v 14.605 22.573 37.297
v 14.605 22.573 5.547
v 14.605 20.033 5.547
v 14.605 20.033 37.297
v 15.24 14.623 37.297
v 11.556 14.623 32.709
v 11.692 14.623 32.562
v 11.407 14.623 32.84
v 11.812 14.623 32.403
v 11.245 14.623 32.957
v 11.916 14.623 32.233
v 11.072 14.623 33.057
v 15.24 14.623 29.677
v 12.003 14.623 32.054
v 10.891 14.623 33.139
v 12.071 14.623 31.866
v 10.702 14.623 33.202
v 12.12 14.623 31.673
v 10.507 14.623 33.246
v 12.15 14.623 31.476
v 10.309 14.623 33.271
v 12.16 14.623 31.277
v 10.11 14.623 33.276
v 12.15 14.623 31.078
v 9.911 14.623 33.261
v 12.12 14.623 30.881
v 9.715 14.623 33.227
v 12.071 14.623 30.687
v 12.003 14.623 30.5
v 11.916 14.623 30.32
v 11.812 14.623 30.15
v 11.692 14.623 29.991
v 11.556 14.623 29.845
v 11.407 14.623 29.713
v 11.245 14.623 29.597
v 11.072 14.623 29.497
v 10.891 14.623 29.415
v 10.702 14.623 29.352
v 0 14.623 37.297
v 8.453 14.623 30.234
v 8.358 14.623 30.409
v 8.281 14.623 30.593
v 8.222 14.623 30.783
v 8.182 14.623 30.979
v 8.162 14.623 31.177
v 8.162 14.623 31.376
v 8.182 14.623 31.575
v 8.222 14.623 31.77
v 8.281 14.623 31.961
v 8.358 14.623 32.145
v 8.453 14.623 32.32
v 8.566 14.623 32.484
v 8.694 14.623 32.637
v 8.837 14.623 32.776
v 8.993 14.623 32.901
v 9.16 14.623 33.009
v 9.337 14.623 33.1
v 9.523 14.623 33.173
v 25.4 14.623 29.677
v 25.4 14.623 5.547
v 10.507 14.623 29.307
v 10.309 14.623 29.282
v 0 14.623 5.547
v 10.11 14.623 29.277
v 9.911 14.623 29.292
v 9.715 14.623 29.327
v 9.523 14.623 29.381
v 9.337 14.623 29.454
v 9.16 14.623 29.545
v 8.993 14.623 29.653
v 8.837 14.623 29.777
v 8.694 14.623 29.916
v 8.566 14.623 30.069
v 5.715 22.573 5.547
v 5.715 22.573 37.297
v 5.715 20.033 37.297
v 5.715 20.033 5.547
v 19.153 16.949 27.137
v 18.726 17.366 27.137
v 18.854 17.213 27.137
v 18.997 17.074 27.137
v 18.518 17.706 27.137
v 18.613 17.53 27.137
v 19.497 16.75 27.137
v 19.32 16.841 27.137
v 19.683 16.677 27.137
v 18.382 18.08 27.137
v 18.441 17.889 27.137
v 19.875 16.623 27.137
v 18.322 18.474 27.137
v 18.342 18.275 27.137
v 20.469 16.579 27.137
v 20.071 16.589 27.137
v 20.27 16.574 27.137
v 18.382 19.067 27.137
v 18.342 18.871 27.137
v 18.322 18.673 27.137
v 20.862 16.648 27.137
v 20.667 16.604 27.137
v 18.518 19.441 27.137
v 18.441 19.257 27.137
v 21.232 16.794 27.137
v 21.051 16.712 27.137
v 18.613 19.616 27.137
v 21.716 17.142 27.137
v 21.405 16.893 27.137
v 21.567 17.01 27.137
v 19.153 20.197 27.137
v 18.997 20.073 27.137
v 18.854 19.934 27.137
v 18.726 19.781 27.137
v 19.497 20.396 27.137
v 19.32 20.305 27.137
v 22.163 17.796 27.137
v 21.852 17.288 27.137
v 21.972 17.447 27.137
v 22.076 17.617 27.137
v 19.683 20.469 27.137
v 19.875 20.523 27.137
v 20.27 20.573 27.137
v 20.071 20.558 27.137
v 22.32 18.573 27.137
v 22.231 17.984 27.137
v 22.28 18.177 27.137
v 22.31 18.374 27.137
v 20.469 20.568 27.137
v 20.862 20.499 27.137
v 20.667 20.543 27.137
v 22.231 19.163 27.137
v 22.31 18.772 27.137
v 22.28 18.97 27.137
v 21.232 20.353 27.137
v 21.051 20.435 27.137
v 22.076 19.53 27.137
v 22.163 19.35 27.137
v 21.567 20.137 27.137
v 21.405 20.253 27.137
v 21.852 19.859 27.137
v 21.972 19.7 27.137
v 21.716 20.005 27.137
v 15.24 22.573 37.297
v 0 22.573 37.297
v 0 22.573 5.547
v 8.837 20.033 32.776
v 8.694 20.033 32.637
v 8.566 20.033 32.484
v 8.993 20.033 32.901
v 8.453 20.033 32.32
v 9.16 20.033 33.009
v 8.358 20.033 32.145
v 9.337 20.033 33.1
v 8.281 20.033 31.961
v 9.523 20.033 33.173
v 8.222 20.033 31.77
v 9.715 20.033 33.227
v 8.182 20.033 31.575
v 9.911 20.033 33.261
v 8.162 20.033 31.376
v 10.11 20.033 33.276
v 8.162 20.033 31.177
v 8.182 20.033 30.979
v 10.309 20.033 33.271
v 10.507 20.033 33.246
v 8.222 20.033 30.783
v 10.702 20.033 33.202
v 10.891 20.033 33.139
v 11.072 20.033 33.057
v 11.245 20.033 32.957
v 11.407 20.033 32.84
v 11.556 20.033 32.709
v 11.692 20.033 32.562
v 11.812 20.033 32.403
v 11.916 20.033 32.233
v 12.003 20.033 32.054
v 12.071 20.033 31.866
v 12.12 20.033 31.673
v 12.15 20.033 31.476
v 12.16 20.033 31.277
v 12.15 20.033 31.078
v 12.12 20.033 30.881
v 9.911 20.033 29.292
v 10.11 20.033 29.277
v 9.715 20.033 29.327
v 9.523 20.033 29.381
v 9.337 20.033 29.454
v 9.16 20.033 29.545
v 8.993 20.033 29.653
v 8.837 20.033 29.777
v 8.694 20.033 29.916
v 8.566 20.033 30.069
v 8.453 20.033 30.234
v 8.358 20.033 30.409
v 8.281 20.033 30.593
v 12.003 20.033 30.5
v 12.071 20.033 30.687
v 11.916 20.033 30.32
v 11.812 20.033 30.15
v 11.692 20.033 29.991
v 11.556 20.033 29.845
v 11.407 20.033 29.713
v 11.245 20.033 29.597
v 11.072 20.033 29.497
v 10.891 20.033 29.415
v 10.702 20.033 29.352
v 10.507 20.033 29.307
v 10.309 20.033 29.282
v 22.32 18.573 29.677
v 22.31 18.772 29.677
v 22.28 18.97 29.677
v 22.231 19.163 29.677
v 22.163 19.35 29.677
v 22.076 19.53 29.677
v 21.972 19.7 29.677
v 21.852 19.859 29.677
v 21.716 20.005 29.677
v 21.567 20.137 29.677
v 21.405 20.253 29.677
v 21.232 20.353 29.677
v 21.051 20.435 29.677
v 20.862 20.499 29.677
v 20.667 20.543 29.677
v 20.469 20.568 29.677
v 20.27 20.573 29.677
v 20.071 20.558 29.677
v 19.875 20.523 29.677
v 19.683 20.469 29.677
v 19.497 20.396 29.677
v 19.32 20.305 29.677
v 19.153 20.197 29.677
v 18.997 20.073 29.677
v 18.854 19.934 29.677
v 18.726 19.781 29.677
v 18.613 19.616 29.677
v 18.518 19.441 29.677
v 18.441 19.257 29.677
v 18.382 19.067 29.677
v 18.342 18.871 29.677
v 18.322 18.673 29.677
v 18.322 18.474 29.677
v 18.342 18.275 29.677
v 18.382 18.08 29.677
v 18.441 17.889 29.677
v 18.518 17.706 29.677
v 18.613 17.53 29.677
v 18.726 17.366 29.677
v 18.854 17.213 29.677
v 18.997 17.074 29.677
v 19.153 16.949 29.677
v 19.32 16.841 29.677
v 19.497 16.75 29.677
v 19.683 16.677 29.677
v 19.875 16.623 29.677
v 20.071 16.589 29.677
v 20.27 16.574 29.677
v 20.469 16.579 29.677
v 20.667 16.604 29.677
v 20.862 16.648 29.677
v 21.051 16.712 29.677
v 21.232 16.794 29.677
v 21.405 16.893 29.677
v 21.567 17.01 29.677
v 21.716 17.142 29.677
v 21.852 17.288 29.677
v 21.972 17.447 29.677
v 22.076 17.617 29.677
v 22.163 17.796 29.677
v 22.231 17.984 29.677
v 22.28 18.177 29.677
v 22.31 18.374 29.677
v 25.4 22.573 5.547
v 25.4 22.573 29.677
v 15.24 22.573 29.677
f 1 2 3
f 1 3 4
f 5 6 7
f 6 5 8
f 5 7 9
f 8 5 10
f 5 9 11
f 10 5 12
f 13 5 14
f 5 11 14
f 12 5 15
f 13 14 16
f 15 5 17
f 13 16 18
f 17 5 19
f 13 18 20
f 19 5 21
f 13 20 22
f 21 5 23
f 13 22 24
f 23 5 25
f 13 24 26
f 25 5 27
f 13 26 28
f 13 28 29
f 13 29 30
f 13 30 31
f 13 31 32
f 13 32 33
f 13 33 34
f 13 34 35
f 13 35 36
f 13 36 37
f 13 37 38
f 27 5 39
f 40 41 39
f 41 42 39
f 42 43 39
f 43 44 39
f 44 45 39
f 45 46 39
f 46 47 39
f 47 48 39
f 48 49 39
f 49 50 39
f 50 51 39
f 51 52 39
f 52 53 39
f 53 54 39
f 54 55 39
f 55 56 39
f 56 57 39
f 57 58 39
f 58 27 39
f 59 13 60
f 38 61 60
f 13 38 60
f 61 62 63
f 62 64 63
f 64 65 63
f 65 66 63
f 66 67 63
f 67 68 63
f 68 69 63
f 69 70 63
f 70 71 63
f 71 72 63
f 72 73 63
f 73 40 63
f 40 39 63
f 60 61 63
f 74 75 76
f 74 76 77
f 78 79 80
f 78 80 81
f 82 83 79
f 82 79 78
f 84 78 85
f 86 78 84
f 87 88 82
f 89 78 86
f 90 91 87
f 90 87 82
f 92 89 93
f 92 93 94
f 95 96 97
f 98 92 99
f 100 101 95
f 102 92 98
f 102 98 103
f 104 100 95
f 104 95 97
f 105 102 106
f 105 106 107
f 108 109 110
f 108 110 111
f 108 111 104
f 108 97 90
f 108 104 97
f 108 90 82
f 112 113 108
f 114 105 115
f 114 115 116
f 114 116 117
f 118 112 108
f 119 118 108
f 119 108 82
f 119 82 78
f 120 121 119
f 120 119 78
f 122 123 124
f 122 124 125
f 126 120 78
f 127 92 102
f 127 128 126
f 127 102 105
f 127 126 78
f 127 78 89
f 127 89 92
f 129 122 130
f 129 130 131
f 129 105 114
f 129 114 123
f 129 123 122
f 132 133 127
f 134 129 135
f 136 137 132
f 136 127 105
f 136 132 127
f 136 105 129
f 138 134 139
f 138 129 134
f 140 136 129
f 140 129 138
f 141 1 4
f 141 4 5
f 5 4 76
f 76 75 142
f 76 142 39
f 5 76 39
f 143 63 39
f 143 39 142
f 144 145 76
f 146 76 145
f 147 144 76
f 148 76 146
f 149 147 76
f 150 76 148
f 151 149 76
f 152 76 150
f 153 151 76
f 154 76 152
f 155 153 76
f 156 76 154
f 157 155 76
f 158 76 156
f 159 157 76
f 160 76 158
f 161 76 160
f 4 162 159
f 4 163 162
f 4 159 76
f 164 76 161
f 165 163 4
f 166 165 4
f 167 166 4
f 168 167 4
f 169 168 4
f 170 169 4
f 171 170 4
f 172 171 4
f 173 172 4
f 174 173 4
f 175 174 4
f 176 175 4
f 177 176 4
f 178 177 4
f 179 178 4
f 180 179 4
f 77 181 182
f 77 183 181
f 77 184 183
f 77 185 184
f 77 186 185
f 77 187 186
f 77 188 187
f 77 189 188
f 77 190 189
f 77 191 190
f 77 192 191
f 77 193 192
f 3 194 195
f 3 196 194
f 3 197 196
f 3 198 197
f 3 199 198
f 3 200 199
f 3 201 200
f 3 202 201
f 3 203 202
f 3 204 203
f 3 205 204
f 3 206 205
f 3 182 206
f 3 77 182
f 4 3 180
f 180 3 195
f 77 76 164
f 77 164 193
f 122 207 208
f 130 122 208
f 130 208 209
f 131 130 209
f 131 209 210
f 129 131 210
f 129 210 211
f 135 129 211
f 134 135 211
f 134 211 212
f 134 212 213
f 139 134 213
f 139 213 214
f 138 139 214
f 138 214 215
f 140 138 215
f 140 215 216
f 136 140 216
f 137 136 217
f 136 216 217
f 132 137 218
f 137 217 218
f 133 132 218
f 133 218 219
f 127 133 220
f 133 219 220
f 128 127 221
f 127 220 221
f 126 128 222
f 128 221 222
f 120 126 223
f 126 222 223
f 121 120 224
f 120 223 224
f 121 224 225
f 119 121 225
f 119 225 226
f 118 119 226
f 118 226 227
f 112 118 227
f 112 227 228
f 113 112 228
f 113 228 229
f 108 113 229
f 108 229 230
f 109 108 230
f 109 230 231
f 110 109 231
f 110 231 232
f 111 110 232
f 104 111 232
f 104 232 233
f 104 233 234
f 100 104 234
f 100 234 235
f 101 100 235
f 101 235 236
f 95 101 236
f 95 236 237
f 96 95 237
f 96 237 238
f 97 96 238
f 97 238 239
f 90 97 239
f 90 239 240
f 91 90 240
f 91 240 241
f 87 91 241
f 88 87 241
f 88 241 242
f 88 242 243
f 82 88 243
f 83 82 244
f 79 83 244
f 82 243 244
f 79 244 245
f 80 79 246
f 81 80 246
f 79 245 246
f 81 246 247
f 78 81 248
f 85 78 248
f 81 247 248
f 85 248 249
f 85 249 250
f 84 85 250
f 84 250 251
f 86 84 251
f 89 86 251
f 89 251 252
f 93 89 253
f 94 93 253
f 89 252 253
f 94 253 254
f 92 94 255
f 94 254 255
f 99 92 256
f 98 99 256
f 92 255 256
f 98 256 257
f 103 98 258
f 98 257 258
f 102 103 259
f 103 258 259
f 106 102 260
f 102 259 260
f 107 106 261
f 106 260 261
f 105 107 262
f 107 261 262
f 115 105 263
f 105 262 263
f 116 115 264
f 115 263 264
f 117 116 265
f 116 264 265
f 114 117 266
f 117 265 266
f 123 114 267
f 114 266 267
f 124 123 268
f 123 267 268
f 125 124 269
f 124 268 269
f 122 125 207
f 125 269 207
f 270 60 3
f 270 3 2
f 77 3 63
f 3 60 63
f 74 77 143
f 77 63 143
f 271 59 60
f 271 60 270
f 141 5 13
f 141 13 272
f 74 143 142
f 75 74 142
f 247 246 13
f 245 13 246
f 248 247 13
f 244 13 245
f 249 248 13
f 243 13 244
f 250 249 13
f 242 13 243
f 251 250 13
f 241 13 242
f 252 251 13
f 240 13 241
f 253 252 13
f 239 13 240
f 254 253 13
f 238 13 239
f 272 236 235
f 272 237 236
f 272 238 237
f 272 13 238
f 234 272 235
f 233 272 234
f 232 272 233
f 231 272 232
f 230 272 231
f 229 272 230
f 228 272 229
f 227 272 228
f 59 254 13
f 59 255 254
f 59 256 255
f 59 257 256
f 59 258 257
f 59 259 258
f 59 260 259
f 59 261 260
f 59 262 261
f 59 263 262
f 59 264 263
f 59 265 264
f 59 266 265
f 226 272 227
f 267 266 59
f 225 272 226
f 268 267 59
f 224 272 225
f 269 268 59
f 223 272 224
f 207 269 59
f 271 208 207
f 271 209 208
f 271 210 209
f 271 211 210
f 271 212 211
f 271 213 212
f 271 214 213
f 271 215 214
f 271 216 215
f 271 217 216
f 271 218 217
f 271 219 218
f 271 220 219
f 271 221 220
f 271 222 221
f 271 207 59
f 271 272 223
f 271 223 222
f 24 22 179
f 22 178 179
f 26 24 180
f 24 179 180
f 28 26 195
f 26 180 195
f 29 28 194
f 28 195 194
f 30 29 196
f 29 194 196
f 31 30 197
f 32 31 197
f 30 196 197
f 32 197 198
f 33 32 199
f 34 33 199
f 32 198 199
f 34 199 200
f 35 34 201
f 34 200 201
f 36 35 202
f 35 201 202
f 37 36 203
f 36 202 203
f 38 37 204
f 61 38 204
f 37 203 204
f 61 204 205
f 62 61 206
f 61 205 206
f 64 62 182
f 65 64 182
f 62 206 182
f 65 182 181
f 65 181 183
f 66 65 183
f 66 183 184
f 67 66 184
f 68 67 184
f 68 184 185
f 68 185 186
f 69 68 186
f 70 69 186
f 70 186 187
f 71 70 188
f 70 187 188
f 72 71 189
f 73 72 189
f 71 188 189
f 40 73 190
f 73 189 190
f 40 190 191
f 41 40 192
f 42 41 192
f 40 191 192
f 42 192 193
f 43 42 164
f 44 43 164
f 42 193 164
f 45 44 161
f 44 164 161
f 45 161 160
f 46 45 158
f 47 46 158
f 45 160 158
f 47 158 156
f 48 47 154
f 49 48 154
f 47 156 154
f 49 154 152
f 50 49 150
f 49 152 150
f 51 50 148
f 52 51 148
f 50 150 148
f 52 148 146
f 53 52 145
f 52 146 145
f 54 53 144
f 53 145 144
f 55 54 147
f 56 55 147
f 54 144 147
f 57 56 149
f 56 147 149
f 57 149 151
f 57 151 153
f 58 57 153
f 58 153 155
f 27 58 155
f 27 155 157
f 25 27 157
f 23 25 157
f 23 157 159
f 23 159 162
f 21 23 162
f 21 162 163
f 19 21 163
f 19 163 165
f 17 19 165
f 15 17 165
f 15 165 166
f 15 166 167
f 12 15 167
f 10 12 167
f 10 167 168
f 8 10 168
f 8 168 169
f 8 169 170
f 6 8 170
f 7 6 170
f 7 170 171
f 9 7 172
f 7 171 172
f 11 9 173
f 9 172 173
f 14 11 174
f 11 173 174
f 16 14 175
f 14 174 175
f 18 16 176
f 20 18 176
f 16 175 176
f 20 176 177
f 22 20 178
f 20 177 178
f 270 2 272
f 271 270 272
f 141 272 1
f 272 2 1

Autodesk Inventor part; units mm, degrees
ref_plane "YZ Plane" through (0, 0, 0) normal (1, 0, 0) x (0, 1, 0)
ref_plane "XZ Plane" through (0, 0, 0) normal (0, 1, 0) x (-1, 0, 0)
ref_plane "XY Plane" through (0, 0, 0) normal (0, 0, 1) x (1, 0, 0)
sketch "Sketch1" plane through (0, 0, 0) normal (1, 0, 0) x (0, 1, 0)
  line L0 (22.5733, 37.2966) -> (14.6231, 37.2966)
  line L1 (14.6231, 37.2966) -> (14.6231, 5.5466)
  line L2 (14.6231, 5.5466) -> (22.5733, 5.5466)
  line L3 (22.5733, 5.5466) -> (22.5733, 37.2966)
  point P0 (0, 0)
  dimension "d0" = 7.9502
  dimension "d1" = 31.75
extrude "Extrusion1" add sketch "Sketch1" along normal blind 25.4
sketch "Sketch2" plane through (0, 14.6231, 37.2966) normal (0, 0, 1) x (1, 0, 0)
  line L0 (0, 7.9502) -> (25.4, 7.9502) projected
  line L1 (25.4, 0) -> (15.24, 0)
  line L2 (15.24, 0) -> (15.24, 7.9502)
  line L3 (15.24, 7.9502) -> (25.4, 7.9502)
  line L4 (25.4, 7.9502) -> (25.4, 0)
  point P0 (0, -14.6231)
  dimension "d4" = 10.16
extrude "Extrusion2" cut sketch "Sketch2" against normal blind 7.62
sketch "Sketch3" plane through (0, 14.6231, 29.6766) normal (0, 0, 1) x (1, 0, 0)
  line L0 (25.4, 7.9502) -> (25.4, 0) projected
  line L1 (15.24, 7.9502) -> (25.4, 7.9502) projected
  line L2 (15.24, 0) -> (15.24, 7.9502) projected
  line L3 (25.4, 0) -> (15.24, 0) projected
  circle A0 centre (20.32, 3.9502) radius 2
  point P0 (0, -14.6231)
  dimension "d7" = 4
  dimension "d10" = 4
extrude "Extrusion3" cut sketch "Sketch3" against normal blind 2.54 contours A0
sketch "Sketch4" plane through (0, 22.5733, 37.2966) normal (0, 1, 0) x (1, 0, 0)
  circle A0 centre (10.16, 6.0198) radius 2
  line L0 (15.24, 0) -> (15.24, 7.62) projected
  line L1 (0, 0) -> (15.24, 0) projected
  point P0 (0, 37.2966)
  dimension "d11" = 4
  dimension "d12" = 5.08
  dimension "d15" = 6.0198
extrude "Extrusion4" cut sketch "Sketch4" against normal blind 25.4
sketch "Sketch5" plane through (0, 22.5733, 37.2966) normal (0, 1, 0) x (1, 0, 0)
  line L0 (0, 0) -> (15.24, 0) projected
  line L1 (0, 31.75) -> (25.4, 31.75) projected
  line L2 (14.605, 0) -> (5.715, 0)
  line L3 (5.715, 0) -> (5.715, 31.75)
  line L4 (5.715, 31.75) -> (14.605, 31.75)
  line L5 (14.605, 31.75) -> (14.605, 0)
  circle A0 centre (10.16, 6.0198) radius 2 projected
  point P0 (0, 37.2966)
  point P1 (5.715, 0)
  dimension "d16" = 8.89
  dimension "d17" = 4.445
extrude "Extrusion5" cut sketch "Sketch5" against normal blind 2.54
properties part number "Metal Inside"
